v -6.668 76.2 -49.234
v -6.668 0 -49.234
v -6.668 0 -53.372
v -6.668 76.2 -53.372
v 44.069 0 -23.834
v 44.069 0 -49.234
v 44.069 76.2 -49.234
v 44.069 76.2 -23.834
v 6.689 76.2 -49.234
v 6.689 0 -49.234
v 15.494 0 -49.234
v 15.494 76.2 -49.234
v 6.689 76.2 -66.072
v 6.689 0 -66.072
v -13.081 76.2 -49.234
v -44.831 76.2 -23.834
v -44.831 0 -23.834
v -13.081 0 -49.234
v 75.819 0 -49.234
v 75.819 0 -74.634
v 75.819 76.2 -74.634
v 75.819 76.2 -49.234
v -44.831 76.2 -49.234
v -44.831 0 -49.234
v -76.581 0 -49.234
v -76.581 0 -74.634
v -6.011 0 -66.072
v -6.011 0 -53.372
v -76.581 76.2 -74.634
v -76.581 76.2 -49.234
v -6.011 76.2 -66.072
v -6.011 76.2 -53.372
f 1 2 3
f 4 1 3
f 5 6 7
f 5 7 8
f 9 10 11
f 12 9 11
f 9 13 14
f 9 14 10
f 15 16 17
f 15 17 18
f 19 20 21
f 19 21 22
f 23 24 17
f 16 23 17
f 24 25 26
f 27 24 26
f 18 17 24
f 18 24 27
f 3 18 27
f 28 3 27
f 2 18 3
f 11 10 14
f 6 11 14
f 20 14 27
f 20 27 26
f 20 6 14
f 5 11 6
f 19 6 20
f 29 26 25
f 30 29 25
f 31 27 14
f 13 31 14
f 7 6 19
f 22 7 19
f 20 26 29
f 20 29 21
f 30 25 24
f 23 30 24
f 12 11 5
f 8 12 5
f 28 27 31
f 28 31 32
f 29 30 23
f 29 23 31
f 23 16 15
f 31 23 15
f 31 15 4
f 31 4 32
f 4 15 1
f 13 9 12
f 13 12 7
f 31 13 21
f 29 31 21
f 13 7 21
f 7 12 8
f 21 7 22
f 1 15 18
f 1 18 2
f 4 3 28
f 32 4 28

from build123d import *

# Parameters (mm, degrees)
F0_W      = 152.4
F0_H      = 50.8
F1_DEPTH  = 76.2
F2_W      = 31.75
F2_H      = 25.4
F3_DEPTH  = 76.2
F4_W      = 31.75
F4_H      = 25.4
F5_DEPTH  = 76.2
F7_DEPTH  = 76.2
F9_DEPTH  = 76.2
F10_W     = 28.575
F10_H     = 25.4
F11_DEPTH = 76.2
F12_W     = 12.7
F12_H     = 12.7
F13_DEPTH = 101.6
F15_DEPTH = 101.6


with BuildPart() as f1:
    # F0 (on Front) → F1 (new body)
    with BuildSketch(Plane.XZ):
        with Locations((-0.381002, -49.234485)):
            Rectangle(F0_W, F0_H)
    extrude(amount=-F1_DEPTH)

    # F2 (on face) → F3 (cut)
    with BuildSketch(Plane.XZ):
        with Locations((-60.706002, -36.534485)):
            Rectangle(F2_W, F2_H)
    extrude(amount=-F3_DEPTH, mode=Mode.SUBTRACT)

    # F4 (on face) → F5 (cut)
    with BuildSketch(Plane.XZ):
        with Locations((59.943998, -36.534485)):
            Rectangle(F4_W, F4_H)
    extrude(amount=-F5_DEPTH, mode=Mode.SUBTRACT)

    # F6 (on face) → F7 (cut)
    with BuildSketch(Plane.XZ):
        Polygon((-13.081002, -23.834485), (-44.831002, -23.834485), (-13.081002, -49.234485), align=None)
    extrude(amount=-F7_DEPTH, mode=Mode.SUBTRACT)

    # F8 (on face) → F9 (cut)
    with BuildSketch(Plane.XZ):
        Polygon((44.068998, -23.834485), (15.493998, -23.834485), (15.493998, -49.234485), align=None)
    extrude(amount=-F9_DEPTH, mode=Mode.SUBTRACT)

    # F10 (on face) → F11 (cut)
    with BuildSketch(Plane.XZ):
        with Locations((1.206498, -36.534485)):
            Rectangle(F10_W, F10_H)
    extrude(amount=-F11_DEPTH, mode=Mode.SUBTRACT)

    # F12 (on face) → F13 (cut)
    with BuildSketch(Plane.XZ):
        with Locations((0.338951, -59.722185)):
            Rectangle(F12_W, F12_H)
    extrude(amount=-F13_DEPTH, mode=Mode.SUBTRACT)

    # F14 (on face) → F15 (cut)
    with BuildSketch(Plane.XZ):
        Polygon((6.688951, -49.234485), (-6.6675, -49.234485), (-6.6675, -53.372185), (-6.011049, -53.372185), (6.688951, -53.372185), align=None)
    extrude(amount=-F15_DEPTH, mode=Mode.SUBTRACT)


solid = f1.part
